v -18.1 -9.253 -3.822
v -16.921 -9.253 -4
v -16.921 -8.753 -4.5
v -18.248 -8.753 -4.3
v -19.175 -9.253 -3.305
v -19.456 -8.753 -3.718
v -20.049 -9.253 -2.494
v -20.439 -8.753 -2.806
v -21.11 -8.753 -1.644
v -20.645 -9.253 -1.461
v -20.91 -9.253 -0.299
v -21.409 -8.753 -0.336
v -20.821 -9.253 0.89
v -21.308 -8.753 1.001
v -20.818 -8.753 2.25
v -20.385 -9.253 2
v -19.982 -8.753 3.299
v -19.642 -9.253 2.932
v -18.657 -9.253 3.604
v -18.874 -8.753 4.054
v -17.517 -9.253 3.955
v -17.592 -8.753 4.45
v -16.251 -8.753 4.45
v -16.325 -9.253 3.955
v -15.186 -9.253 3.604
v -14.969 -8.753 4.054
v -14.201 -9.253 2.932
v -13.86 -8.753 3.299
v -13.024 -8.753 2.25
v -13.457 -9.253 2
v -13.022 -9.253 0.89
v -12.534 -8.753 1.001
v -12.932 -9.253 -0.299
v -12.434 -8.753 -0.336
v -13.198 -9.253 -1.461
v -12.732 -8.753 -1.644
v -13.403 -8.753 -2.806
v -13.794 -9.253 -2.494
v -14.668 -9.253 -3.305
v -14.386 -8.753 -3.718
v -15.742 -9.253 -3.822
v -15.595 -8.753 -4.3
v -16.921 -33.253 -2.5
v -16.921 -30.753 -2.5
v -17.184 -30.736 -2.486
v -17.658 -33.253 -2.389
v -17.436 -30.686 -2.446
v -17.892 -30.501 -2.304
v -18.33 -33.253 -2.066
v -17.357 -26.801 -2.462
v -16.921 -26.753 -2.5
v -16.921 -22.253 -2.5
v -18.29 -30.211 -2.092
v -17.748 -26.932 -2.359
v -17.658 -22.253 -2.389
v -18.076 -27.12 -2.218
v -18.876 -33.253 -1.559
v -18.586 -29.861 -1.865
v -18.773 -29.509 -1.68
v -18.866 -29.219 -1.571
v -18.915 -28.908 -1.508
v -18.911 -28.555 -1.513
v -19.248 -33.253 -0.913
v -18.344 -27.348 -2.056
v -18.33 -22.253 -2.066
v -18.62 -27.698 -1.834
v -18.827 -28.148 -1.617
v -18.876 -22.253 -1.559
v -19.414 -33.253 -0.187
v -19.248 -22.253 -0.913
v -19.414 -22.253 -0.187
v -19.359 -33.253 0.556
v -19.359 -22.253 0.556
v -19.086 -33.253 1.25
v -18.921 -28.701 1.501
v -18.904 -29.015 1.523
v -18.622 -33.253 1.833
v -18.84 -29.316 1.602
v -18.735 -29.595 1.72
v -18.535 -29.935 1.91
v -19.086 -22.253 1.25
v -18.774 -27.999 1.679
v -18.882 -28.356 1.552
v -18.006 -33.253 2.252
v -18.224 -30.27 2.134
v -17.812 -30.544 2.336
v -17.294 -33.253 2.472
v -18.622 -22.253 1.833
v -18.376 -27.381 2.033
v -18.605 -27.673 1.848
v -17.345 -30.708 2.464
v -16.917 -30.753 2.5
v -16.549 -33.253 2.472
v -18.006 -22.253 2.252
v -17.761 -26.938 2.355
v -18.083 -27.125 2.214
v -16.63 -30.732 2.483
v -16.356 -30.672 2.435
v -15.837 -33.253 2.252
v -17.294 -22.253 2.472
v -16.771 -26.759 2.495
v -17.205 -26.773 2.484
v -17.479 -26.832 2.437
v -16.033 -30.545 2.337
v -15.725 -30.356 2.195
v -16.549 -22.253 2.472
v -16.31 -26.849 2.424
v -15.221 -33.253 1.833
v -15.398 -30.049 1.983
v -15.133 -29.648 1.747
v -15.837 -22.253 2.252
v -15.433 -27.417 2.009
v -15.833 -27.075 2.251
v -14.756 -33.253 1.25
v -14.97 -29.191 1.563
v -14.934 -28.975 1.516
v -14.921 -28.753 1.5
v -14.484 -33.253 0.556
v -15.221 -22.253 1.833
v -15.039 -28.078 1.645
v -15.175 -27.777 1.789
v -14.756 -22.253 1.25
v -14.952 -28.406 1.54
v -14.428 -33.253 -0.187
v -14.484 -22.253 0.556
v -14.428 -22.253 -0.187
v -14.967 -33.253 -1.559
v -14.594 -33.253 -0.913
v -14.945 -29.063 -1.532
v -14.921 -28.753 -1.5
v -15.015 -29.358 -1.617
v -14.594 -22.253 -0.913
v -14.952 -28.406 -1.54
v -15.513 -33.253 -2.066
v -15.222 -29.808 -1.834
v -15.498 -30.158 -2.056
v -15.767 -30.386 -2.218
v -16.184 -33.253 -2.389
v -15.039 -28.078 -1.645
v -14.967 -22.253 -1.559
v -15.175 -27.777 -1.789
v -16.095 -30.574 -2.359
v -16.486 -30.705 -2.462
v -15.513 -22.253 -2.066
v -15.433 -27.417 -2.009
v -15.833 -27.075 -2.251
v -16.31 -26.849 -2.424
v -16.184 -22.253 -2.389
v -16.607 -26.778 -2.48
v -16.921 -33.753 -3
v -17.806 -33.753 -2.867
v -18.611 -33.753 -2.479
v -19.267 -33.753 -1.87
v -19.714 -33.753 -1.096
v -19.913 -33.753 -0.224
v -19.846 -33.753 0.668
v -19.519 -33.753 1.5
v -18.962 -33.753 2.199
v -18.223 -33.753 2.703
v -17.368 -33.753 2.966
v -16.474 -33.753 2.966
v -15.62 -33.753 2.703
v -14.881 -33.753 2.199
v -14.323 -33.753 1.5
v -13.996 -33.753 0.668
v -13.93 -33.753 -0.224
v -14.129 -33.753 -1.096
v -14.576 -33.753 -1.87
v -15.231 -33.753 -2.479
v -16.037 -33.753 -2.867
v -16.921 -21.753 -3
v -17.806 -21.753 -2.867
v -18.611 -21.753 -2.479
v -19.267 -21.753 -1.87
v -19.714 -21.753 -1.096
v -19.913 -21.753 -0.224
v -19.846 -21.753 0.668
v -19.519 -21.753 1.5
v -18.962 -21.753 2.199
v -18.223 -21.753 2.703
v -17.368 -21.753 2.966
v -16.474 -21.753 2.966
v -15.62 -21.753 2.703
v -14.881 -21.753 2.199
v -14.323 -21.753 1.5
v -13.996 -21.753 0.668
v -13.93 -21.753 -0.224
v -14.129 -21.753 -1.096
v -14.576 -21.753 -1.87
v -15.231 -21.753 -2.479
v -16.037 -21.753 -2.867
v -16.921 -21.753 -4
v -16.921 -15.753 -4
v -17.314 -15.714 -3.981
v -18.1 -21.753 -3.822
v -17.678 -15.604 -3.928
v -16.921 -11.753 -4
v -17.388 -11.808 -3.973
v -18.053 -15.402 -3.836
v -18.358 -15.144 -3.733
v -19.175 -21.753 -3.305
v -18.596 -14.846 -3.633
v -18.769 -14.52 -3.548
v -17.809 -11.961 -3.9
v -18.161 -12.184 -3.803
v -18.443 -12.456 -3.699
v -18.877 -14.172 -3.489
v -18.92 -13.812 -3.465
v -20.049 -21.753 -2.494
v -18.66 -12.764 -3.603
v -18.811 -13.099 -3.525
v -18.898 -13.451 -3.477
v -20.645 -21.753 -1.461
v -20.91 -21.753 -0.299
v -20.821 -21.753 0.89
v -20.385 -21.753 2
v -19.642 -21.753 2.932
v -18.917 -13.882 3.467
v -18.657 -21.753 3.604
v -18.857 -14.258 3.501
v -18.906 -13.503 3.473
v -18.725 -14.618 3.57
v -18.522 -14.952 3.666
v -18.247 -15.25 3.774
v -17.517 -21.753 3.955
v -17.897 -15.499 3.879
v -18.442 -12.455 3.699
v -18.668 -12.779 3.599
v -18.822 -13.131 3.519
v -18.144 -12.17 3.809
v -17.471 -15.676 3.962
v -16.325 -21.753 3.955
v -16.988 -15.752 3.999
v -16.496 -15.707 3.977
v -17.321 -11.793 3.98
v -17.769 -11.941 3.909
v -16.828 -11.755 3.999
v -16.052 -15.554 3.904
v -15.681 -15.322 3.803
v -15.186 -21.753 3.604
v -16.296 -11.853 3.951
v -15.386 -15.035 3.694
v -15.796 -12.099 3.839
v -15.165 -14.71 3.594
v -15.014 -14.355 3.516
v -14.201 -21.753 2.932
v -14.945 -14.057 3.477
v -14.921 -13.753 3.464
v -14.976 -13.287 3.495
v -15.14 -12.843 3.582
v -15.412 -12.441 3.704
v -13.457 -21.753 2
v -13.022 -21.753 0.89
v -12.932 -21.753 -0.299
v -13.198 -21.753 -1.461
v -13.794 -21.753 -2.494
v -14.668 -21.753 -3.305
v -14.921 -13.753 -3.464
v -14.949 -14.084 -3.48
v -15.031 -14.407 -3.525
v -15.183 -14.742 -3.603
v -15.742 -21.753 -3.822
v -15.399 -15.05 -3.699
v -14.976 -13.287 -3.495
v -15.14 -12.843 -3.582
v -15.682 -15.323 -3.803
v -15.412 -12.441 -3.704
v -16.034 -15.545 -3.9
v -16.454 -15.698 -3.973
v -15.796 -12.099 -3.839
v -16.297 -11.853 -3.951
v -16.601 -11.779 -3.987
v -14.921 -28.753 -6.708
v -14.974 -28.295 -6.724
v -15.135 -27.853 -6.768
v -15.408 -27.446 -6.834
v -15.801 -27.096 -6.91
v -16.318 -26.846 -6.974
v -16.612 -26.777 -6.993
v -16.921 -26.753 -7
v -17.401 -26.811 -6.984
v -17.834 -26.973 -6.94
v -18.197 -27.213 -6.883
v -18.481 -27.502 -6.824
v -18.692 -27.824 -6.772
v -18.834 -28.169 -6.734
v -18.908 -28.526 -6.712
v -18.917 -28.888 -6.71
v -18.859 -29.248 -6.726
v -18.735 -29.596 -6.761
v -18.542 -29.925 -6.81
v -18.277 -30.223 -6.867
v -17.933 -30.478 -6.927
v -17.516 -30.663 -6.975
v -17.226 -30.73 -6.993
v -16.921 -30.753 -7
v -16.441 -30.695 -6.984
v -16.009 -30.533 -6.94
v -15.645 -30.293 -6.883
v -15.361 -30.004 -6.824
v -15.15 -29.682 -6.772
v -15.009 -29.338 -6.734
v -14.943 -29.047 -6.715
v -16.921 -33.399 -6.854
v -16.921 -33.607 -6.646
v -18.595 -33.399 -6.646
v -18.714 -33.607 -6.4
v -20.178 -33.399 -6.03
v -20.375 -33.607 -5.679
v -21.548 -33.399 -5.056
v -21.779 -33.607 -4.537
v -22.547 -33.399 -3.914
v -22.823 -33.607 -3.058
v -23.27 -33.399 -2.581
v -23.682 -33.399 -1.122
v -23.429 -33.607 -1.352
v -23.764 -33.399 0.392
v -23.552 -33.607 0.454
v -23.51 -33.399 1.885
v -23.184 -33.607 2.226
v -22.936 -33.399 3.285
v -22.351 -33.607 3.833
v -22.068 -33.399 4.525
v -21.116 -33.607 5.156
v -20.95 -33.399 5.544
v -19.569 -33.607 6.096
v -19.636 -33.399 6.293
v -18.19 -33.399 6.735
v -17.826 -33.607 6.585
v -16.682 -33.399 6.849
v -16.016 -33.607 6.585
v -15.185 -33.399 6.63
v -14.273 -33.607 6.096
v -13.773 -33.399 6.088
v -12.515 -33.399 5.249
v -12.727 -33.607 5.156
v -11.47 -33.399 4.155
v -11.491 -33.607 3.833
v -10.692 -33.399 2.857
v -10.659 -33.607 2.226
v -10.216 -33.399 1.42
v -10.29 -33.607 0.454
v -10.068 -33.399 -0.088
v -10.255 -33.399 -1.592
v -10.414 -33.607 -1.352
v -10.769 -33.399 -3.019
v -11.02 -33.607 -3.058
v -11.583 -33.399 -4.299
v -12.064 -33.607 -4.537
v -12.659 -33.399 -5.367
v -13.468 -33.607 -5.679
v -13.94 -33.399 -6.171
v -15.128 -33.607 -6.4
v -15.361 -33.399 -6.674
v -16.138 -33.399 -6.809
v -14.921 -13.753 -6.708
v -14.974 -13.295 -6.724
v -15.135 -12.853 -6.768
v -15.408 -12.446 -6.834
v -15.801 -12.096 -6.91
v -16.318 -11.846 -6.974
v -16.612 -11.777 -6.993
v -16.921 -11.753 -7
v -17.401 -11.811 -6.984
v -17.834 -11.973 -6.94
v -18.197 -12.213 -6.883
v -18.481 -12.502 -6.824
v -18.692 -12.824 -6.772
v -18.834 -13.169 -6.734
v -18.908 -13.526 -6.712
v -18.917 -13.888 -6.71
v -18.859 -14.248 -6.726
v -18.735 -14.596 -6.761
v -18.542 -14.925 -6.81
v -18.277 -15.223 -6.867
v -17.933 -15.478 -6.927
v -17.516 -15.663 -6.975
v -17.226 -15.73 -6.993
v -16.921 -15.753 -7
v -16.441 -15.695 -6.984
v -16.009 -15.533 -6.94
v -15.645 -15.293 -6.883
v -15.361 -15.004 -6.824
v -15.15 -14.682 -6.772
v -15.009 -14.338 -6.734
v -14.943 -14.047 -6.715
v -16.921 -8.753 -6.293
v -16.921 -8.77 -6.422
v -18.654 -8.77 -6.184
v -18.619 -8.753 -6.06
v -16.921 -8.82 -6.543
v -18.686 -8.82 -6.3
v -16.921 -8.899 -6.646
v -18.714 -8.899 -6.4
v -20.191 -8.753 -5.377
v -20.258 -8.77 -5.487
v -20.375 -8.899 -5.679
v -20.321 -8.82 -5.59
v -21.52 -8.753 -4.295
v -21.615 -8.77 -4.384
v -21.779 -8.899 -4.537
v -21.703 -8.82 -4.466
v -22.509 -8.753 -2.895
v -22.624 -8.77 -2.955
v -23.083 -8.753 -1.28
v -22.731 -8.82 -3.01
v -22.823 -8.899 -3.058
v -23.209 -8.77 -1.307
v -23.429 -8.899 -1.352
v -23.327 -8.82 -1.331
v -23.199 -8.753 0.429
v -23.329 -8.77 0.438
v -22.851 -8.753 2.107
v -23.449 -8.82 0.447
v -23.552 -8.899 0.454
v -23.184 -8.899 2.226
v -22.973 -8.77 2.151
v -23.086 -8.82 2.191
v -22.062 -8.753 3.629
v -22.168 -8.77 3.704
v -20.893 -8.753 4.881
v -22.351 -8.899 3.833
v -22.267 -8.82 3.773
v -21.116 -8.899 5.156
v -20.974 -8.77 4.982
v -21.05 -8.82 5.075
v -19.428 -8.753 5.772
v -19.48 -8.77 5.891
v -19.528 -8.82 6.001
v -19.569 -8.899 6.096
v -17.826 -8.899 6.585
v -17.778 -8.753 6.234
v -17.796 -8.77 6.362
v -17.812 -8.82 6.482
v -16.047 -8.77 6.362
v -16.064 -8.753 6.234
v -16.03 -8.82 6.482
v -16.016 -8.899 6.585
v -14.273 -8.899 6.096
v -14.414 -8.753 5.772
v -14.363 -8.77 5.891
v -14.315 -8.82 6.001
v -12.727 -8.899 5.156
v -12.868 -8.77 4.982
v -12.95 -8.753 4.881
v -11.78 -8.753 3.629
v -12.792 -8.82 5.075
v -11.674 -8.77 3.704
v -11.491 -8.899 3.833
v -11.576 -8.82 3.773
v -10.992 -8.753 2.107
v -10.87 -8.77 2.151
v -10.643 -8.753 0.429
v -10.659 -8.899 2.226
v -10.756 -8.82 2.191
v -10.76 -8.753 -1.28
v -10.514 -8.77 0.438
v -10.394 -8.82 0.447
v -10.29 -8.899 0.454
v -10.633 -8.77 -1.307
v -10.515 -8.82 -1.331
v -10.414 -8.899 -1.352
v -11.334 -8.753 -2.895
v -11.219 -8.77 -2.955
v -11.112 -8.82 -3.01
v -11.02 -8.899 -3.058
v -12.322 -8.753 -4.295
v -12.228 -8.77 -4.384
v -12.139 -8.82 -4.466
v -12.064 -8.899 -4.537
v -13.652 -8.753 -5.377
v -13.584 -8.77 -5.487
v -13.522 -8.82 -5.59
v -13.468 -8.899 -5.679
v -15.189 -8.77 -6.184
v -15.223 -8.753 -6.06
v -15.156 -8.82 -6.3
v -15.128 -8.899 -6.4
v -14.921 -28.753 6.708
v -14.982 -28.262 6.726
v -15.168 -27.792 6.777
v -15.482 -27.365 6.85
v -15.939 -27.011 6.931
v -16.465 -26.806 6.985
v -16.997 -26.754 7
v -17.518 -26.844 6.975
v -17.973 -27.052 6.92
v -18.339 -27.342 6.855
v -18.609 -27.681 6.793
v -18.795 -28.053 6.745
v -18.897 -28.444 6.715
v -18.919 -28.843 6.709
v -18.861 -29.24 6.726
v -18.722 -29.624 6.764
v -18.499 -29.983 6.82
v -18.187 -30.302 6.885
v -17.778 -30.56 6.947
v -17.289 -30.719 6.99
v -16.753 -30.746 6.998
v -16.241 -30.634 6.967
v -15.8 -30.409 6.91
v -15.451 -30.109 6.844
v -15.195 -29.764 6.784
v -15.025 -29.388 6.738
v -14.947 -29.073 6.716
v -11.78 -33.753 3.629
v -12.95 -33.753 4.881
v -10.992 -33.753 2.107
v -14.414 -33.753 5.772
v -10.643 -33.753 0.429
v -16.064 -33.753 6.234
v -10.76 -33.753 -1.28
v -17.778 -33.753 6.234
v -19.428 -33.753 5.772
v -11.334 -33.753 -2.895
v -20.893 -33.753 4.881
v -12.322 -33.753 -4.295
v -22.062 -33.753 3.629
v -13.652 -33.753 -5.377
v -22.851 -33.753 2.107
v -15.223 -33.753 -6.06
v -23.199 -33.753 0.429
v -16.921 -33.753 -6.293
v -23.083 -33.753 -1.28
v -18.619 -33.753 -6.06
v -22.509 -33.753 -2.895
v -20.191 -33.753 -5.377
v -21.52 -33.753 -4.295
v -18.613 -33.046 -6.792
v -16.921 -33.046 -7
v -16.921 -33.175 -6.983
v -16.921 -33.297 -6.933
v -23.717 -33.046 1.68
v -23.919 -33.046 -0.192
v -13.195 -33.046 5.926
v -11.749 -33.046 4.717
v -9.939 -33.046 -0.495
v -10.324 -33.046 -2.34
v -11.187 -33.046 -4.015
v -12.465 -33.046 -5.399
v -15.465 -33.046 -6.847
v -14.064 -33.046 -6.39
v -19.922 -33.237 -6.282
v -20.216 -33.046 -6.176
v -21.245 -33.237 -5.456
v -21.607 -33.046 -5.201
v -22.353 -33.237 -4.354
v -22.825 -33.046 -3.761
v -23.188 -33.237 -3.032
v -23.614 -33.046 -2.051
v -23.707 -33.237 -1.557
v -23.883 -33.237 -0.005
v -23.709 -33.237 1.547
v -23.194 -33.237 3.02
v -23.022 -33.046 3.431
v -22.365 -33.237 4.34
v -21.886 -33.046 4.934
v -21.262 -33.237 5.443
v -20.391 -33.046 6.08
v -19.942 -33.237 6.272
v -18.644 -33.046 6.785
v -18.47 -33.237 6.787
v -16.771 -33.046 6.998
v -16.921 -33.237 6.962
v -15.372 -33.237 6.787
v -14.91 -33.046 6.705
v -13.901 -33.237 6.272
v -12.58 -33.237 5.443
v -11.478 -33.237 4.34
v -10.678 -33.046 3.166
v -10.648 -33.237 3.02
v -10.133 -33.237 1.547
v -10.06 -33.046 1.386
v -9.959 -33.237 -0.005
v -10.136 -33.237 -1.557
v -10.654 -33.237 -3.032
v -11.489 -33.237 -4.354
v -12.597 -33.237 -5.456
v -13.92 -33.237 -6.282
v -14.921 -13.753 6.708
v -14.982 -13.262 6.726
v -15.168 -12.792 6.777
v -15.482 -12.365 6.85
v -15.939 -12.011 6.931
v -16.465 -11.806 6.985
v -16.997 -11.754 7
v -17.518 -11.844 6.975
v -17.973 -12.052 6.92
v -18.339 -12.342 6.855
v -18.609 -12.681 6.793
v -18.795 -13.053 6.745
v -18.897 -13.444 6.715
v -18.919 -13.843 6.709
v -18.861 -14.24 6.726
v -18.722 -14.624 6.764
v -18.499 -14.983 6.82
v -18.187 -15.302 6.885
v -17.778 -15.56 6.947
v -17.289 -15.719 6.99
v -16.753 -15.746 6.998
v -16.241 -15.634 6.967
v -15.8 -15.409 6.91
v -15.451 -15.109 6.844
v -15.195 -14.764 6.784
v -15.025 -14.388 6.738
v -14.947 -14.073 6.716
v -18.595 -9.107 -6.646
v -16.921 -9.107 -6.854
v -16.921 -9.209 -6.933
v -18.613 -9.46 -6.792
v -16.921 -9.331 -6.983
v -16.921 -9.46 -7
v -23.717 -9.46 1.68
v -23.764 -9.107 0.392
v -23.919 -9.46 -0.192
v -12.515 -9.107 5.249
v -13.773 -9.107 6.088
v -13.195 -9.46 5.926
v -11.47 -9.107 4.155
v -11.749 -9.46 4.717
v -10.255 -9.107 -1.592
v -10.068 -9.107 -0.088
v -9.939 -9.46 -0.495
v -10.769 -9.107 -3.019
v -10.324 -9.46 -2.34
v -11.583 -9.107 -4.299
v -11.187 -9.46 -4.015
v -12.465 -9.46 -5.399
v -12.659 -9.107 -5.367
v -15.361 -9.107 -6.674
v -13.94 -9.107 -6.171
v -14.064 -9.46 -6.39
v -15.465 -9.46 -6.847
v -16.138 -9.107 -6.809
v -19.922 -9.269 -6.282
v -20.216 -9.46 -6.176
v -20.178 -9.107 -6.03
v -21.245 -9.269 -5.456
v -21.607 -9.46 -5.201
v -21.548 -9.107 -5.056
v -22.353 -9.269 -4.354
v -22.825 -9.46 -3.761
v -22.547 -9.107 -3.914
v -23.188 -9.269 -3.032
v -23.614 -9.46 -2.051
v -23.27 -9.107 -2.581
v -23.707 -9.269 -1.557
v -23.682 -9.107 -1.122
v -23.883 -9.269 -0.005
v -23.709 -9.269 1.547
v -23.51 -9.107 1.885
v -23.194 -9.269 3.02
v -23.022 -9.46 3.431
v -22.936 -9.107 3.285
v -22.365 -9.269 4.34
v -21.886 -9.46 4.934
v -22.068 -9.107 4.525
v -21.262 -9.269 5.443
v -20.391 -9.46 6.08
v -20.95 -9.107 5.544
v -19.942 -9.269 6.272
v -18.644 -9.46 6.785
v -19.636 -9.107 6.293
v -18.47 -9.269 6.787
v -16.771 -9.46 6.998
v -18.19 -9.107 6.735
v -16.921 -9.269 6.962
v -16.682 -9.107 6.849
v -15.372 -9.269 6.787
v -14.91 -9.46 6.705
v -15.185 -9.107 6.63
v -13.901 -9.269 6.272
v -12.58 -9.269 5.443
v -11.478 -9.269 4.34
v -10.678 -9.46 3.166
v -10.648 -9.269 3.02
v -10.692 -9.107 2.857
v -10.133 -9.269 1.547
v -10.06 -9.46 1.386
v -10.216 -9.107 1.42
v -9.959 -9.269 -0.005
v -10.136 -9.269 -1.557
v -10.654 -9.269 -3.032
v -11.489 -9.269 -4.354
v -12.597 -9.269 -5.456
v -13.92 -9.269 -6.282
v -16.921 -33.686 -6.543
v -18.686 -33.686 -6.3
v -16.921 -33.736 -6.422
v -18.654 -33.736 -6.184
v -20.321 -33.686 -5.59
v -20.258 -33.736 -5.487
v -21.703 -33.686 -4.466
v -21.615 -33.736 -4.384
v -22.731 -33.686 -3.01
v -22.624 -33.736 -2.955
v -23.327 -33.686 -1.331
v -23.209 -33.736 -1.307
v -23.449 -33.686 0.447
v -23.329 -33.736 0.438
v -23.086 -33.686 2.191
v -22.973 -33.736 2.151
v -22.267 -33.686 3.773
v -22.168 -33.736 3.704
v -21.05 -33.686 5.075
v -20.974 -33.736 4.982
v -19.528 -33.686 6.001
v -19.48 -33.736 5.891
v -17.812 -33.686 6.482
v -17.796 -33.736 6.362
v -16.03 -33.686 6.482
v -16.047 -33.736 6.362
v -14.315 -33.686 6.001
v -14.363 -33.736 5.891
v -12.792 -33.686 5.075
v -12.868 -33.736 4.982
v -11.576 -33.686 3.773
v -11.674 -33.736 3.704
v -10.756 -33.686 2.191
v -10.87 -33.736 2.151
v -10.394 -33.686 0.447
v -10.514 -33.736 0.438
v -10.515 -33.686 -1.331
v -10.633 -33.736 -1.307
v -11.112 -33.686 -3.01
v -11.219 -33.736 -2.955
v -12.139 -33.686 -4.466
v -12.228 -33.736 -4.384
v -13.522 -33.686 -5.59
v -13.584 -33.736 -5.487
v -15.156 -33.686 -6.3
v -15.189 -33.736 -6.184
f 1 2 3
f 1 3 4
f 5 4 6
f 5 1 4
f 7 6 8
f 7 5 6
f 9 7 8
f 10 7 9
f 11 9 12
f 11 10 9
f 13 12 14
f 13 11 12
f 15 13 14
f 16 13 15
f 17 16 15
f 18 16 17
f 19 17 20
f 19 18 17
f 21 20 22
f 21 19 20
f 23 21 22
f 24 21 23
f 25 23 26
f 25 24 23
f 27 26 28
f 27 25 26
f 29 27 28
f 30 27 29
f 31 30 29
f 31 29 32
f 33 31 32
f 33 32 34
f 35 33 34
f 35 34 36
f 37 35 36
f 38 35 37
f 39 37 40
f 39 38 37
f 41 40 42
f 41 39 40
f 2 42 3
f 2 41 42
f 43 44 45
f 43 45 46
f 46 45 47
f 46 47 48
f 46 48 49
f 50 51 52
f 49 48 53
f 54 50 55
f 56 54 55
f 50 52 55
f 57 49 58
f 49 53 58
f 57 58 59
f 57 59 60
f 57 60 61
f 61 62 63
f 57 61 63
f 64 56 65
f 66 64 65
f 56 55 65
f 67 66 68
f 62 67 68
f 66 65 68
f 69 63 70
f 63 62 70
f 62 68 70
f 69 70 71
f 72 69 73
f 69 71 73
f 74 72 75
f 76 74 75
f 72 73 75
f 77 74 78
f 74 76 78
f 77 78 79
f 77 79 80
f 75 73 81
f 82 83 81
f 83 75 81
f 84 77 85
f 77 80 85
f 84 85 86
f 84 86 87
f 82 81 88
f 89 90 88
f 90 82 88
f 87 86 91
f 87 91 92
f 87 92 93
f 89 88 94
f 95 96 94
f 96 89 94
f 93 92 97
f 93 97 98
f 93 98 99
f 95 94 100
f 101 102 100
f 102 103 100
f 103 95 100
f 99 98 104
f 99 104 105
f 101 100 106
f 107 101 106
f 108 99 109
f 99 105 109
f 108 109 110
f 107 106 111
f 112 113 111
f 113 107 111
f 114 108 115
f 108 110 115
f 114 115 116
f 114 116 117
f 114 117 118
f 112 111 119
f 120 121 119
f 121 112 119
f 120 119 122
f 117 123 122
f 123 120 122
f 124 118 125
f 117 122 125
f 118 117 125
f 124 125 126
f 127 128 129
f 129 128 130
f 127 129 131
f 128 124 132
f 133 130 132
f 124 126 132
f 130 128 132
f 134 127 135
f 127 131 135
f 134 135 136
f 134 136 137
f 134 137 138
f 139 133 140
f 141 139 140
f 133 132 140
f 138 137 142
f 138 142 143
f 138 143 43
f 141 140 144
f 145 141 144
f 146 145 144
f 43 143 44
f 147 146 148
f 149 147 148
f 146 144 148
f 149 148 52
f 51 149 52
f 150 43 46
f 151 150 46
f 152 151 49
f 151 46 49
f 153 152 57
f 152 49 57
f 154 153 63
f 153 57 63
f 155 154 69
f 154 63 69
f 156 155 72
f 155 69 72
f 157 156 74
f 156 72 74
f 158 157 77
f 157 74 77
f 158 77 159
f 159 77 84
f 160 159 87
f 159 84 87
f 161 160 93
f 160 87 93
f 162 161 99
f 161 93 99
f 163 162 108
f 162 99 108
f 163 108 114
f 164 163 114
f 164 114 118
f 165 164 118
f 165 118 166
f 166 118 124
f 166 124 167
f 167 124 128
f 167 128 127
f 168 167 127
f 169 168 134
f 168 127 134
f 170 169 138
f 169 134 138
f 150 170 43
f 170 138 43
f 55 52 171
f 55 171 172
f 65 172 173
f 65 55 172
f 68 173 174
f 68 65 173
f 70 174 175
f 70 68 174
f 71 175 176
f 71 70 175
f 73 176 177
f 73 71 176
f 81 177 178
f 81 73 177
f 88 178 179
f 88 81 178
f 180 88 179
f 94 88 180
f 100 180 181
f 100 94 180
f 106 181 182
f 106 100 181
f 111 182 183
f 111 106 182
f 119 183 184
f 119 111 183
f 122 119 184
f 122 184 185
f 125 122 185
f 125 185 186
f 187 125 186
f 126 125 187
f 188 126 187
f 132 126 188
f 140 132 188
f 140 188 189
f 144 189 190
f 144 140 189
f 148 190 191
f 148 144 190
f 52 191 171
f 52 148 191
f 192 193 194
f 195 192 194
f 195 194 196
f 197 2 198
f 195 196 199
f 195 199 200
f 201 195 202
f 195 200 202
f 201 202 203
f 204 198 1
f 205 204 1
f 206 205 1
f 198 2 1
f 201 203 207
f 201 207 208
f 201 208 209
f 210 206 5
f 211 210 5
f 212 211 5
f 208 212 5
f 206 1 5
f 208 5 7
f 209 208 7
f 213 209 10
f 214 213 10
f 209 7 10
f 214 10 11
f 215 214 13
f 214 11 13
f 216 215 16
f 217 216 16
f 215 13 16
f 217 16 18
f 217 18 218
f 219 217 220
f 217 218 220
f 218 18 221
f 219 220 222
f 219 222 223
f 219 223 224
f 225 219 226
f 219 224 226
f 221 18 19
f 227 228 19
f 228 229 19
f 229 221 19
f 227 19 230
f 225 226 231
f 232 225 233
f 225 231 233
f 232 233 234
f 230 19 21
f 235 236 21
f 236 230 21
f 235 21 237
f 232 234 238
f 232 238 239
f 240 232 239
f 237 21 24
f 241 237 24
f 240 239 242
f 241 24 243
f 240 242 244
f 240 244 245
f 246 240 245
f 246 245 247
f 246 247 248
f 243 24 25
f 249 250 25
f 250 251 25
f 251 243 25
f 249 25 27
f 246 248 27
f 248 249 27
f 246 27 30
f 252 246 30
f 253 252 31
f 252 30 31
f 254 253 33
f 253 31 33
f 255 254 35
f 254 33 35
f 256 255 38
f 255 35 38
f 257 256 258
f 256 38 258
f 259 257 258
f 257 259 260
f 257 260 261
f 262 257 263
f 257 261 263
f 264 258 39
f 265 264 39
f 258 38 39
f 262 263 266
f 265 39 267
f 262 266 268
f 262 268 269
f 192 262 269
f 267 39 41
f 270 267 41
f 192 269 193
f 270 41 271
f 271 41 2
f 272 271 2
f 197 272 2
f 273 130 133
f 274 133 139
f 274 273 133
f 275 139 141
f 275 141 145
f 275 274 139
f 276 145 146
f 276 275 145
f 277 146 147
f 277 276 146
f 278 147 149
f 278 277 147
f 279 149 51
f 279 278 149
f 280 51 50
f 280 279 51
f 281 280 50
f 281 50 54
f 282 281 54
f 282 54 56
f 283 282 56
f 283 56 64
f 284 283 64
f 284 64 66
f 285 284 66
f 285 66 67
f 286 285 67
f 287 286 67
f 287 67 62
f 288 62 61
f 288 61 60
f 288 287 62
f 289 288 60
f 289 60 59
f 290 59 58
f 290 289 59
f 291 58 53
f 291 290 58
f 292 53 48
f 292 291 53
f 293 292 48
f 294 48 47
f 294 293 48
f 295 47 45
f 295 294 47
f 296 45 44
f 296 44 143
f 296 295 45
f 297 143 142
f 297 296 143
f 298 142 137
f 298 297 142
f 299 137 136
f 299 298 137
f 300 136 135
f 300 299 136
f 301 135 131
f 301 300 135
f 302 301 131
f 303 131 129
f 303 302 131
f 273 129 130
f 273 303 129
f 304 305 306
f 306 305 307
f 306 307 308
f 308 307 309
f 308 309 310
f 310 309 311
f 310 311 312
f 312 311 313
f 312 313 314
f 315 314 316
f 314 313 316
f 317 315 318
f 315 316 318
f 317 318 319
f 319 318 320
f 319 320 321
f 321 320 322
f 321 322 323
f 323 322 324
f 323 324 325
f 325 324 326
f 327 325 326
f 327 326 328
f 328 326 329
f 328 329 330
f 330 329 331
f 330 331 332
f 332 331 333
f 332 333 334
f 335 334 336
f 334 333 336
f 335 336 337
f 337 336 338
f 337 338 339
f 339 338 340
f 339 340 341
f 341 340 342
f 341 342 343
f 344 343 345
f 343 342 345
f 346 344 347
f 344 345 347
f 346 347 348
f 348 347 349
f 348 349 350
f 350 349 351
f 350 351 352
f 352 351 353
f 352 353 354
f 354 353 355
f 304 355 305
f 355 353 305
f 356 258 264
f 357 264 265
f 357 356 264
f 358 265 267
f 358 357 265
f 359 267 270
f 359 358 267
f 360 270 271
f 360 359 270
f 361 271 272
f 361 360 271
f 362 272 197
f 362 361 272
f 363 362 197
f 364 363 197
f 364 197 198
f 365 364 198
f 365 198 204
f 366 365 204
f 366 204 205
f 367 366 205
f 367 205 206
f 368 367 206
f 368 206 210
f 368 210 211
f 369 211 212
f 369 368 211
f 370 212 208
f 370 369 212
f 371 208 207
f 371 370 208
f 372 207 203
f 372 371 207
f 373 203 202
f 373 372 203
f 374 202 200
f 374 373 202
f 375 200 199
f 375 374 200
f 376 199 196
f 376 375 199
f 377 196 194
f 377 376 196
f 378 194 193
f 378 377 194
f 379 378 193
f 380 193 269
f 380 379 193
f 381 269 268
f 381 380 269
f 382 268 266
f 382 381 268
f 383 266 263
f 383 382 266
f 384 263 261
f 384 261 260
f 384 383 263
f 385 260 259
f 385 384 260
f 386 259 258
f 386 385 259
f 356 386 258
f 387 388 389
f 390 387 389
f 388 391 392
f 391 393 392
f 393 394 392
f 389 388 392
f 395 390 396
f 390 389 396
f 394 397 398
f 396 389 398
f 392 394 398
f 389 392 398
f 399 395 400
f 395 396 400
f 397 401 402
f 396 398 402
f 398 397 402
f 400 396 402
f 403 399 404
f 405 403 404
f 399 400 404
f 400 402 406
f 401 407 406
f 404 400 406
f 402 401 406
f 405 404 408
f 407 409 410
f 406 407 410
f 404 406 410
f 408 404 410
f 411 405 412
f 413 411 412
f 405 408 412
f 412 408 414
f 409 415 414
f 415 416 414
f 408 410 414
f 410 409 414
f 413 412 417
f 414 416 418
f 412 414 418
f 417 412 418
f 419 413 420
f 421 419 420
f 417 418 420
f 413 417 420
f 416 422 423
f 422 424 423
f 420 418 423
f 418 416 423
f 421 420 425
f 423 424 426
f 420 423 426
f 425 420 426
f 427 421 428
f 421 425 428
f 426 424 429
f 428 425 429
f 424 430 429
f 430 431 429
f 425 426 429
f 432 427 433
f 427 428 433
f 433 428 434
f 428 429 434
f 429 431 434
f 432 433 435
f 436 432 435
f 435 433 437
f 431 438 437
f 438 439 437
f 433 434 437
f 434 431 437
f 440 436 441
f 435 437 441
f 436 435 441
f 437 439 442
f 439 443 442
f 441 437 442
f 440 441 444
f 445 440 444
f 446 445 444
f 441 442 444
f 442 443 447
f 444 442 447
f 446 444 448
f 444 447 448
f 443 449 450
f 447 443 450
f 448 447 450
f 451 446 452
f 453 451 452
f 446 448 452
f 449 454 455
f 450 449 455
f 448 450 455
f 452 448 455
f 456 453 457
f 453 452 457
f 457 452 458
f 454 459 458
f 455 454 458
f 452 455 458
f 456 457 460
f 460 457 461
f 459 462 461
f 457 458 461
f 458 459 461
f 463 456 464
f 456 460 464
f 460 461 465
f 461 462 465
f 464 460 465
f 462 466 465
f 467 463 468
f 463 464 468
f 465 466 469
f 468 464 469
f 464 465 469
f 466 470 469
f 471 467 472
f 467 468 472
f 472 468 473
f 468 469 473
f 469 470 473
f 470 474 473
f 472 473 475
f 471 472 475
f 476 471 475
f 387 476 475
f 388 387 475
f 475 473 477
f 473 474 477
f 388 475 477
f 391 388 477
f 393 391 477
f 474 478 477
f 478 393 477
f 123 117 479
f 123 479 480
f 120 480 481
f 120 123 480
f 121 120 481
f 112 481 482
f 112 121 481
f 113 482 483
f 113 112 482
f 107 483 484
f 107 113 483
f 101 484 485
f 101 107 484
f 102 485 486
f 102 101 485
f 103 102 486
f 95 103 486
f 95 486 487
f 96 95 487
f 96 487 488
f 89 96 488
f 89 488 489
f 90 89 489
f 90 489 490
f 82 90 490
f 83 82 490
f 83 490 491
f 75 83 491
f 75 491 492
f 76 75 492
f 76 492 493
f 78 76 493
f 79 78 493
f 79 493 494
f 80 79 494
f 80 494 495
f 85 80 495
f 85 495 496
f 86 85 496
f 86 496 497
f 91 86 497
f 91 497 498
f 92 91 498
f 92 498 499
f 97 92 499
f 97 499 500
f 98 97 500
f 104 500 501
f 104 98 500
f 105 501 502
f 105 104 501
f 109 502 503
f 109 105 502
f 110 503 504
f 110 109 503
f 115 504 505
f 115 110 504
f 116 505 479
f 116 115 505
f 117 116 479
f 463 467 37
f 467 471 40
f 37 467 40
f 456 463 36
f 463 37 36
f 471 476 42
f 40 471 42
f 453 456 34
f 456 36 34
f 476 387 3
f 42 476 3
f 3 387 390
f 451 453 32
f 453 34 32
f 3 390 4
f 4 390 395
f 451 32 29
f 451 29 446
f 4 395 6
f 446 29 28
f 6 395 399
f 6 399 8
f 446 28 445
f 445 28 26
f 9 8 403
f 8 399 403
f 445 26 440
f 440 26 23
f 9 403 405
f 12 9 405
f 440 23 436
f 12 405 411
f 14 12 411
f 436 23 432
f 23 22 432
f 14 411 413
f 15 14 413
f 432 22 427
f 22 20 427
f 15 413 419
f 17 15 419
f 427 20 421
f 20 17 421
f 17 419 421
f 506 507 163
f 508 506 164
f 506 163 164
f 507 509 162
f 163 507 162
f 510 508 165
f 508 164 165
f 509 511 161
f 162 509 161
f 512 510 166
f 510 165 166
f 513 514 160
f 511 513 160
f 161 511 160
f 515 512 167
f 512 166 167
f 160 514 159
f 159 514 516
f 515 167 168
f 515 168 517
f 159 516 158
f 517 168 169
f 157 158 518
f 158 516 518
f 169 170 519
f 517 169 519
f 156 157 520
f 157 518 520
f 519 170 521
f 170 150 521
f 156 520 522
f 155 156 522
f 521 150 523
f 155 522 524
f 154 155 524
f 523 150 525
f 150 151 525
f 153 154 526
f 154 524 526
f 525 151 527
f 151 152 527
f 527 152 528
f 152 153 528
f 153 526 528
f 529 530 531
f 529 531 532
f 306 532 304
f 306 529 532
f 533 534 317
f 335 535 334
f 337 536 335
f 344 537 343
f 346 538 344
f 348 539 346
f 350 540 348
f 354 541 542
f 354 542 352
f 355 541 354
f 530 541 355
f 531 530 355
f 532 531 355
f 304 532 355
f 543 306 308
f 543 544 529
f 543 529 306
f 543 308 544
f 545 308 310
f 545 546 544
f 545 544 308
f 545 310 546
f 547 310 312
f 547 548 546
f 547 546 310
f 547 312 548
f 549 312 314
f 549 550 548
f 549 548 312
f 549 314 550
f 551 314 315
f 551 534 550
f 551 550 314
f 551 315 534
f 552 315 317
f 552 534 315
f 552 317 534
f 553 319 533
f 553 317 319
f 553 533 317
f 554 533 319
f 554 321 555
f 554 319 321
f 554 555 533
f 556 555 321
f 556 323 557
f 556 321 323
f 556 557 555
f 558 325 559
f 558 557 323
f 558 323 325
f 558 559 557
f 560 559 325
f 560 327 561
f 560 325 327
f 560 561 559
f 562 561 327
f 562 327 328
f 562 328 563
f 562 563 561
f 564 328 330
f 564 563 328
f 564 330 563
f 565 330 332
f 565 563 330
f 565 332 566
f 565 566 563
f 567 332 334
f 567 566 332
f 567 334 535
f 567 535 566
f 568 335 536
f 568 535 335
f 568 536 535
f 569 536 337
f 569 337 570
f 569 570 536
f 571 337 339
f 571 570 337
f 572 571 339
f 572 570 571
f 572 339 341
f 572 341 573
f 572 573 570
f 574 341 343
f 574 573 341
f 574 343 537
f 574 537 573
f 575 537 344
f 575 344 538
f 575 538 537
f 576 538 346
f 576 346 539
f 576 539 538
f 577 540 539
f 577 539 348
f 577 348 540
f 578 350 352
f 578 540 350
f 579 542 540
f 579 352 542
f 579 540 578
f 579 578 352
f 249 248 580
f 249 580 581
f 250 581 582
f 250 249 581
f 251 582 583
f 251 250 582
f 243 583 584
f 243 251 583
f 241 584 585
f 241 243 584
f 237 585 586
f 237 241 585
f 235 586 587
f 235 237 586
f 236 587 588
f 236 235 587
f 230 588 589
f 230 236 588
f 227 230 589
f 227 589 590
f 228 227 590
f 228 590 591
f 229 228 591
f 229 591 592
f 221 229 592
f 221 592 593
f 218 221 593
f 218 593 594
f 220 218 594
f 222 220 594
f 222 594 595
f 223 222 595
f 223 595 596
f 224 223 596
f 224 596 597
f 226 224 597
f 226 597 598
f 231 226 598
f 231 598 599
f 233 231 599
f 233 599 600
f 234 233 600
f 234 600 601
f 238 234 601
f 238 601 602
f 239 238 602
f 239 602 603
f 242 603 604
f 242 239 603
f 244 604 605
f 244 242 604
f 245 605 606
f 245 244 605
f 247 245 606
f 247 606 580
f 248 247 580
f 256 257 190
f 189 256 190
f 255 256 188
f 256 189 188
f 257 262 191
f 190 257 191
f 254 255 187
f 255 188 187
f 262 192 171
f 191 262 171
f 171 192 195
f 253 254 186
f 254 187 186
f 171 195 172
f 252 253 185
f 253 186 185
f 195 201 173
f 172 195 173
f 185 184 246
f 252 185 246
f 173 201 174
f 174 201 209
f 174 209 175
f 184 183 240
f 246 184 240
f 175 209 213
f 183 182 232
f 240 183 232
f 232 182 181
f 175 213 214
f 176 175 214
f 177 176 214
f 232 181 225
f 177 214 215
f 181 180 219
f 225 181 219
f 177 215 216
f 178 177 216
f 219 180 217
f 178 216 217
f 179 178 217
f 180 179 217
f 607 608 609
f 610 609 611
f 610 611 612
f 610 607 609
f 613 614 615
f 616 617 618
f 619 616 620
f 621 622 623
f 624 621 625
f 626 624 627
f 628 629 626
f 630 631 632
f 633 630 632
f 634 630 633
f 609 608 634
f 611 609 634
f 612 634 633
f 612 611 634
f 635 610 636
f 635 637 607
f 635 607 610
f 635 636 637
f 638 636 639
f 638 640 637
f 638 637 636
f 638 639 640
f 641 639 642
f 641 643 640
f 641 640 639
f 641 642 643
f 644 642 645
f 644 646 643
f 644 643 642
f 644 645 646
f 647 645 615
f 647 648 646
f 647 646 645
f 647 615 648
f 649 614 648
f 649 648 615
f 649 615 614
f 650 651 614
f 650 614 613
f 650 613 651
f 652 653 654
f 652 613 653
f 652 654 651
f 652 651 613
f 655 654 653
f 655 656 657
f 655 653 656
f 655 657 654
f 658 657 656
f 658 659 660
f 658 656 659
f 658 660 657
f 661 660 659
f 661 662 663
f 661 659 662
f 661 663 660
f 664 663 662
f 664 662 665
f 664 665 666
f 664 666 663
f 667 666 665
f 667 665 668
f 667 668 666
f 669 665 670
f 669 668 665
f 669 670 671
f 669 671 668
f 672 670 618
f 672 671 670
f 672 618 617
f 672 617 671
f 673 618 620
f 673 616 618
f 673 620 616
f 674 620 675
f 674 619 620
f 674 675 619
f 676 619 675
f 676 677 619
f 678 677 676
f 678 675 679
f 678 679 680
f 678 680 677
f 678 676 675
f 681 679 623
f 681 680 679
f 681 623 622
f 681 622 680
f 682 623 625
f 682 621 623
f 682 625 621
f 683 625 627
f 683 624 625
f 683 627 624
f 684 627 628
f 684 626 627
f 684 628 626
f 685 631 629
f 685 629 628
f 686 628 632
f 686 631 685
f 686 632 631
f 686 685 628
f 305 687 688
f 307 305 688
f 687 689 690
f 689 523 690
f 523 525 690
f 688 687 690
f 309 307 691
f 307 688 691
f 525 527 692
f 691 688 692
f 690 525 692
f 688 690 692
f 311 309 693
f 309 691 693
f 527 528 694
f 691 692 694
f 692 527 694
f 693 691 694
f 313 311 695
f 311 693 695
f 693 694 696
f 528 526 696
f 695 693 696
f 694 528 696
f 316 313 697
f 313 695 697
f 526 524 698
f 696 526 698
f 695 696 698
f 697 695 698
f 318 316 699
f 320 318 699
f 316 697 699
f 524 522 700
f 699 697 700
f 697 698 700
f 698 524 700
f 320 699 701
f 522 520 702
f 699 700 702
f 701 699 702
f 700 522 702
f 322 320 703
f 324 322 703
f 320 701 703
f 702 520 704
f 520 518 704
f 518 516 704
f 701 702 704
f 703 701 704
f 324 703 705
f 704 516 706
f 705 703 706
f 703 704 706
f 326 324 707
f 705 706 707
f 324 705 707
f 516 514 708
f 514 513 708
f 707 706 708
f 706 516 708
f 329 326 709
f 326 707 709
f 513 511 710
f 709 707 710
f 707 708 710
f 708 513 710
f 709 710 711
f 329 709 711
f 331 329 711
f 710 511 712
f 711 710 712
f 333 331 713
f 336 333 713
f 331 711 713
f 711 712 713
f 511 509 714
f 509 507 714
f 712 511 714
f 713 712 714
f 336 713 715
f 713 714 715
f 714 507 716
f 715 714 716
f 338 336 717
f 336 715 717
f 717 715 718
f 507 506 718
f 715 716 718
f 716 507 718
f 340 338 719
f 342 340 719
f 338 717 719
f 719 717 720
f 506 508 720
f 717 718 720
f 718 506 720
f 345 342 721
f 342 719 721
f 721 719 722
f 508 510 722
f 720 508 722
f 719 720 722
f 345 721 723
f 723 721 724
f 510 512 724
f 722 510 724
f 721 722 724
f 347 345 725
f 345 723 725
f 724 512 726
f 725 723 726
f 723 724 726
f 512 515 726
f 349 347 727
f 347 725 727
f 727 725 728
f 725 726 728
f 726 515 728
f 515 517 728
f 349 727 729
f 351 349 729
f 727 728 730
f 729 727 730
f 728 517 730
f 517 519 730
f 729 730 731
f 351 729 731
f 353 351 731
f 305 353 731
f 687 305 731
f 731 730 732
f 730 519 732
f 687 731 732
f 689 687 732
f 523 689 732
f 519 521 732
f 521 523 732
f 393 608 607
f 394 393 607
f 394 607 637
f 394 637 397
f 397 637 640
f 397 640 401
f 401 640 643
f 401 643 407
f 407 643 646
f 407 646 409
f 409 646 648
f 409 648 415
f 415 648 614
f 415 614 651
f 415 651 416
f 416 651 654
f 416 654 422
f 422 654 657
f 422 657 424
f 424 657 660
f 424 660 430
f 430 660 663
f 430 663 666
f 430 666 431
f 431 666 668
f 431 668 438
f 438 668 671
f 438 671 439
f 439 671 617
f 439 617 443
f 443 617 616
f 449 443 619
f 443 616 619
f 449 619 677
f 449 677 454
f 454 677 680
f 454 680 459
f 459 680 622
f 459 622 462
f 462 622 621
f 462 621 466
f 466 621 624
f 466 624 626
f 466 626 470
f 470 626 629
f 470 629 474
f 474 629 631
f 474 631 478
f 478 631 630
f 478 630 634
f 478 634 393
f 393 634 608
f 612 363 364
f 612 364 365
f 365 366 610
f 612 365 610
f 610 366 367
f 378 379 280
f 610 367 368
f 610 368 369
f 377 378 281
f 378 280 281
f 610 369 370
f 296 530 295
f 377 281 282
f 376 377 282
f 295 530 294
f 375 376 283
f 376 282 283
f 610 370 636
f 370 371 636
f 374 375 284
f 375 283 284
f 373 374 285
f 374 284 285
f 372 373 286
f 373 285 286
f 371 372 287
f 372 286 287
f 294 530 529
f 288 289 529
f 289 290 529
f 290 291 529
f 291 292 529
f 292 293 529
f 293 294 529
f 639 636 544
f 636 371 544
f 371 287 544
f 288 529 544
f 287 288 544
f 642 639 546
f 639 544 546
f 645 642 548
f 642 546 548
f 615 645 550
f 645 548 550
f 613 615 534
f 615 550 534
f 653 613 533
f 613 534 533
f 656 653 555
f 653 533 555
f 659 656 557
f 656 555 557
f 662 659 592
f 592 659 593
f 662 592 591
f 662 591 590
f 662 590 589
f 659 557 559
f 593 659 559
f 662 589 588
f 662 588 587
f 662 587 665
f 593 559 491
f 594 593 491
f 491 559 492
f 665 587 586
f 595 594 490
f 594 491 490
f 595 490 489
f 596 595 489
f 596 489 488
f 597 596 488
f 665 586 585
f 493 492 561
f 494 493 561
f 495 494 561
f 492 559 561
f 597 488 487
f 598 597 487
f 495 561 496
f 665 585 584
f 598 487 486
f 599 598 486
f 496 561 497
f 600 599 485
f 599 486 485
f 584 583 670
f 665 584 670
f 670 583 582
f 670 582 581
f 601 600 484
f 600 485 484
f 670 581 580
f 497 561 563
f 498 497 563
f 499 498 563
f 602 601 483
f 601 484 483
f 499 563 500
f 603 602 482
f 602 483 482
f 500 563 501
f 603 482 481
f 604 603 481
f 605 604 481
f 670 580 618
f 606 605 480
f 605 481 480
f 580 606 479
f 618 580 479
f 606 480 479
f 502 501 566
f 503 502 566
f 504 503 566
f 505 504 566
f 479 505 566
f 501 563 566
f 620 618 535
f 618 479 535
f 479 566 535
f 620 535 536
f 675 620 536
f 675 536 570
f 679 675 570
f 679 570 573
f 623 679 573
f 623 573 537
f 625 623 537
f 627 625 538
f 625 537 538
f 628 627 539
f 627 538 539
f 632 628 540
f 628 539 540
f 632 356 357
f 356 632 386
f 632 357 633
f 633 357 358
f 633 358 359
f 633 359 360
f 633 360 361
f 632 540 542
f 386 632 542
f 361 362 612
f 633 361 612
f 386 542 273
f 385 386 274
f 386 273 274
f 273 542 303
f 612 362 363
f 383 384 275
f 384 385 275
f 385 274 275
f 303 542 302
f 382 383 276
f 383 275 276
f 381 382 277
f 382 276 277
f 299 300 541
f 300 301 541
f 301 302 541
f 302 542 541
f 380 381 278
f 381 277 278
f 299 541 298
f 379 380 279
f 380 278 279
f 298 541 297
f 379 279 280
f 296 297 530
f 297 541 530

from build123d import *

# Parameters (mm, degrees)
WYTNIJ_WYCI_GNI_CIE1_DEPTH      = 42.958230131
WYTNIJ_WYCI_GNI_CIE1_DEPTH_BACK = 42.958230131
SZKIC2_R                        = 2
SFAZOWANIE1_SIZE                = 0.5
ZAOKR_GLENIE1_R                 = 0.5
SFAZOWANIE2_SIZE                = 0.5


with BuildPart() as part:
    # Szkic1 → Obrót1 (revolve)
    with BuildSketch(Plane.XY, mode=Mode.PRIVATE) as obr_t1_sk:
        Polygon((-20.921239747, -8.753034896), (-23.921239747, -8.753034896), (-23.921239747, -33.753034896), (-19.421239747, -33.753034896), (-19.421239747, -21.753034896), (-20.921239747, -21.753034896), align=None)
    revolve(obr_t1_sk.sketch.rotate(Axis((-16.921239747, -33.753034896, 0), (0, 1, 0)), 270), axis=Axis((-16.921239747, -33.753034896, 0), (0, 1, 0)))

    # Szkic2 → Wytnij-wyciągnięcie1 (cut, two sides: drawn at the far end of the back side and taken through both)
    with BuildSketch(Plane.XY.offset(-WYTNIJ_WYCI_GNI_CIE1_DEPTH_BACK)):
        with Locations((-16.921239747, -13.753034896)):
            Circle(SZKIC2_R)
        with Locations((-16.921239747, -28.753034896)):
            Circle(SZKIC2_R)
    extrude(amount=WYTNIJ_WYCI_GNI_CIE1_DEPTH + WYTNIJ_WYCI_GNI_CIE1_DEPTH_BACK, mode=Mode.SUBTRACT)

    # Sfazowanie1
    sfazowanie1_edges = [part.edges().sort_by_distance(p)[0] for p in [
        (-16.921239747, -33.753034896, 2.5),
        (-16.921239747, -33.753034896, 7),
        (-16.921239747, -8.753034896, 7),
        (-16.921239747, -8.753034896, 4),
    ]]
    chamfer(sfazowanie1_edges, length=SFAZOWANIE1_SIZE)

    # Zaokrąglenie1
    zaokr_glenie1_edges = [part.edges().sort_by_distance(p)[0] for p in [
        (-16.921239747, -33.753034896, 6.5),
        (-16.921239747, -9.253034896, 7),
        (-16.921239747, -33.253034896, 7),
        (-16.921239747, -8.753034896, 6.5),
    ]]
    fillet(zaokr_glenie1_edges, radius=ZAOKR_GLENIE1_R)

    # Sfazowanie2
    sfazowanie2_edges = [part.edges().sort_by_distance(p)[0] for p in [
        (-16.921239747, -21.753034896, 2.5),
    ]]
    chamfer(sfazowanie2_edges, length=SFAZOWANIE2_SIZE)


solid = part.part
